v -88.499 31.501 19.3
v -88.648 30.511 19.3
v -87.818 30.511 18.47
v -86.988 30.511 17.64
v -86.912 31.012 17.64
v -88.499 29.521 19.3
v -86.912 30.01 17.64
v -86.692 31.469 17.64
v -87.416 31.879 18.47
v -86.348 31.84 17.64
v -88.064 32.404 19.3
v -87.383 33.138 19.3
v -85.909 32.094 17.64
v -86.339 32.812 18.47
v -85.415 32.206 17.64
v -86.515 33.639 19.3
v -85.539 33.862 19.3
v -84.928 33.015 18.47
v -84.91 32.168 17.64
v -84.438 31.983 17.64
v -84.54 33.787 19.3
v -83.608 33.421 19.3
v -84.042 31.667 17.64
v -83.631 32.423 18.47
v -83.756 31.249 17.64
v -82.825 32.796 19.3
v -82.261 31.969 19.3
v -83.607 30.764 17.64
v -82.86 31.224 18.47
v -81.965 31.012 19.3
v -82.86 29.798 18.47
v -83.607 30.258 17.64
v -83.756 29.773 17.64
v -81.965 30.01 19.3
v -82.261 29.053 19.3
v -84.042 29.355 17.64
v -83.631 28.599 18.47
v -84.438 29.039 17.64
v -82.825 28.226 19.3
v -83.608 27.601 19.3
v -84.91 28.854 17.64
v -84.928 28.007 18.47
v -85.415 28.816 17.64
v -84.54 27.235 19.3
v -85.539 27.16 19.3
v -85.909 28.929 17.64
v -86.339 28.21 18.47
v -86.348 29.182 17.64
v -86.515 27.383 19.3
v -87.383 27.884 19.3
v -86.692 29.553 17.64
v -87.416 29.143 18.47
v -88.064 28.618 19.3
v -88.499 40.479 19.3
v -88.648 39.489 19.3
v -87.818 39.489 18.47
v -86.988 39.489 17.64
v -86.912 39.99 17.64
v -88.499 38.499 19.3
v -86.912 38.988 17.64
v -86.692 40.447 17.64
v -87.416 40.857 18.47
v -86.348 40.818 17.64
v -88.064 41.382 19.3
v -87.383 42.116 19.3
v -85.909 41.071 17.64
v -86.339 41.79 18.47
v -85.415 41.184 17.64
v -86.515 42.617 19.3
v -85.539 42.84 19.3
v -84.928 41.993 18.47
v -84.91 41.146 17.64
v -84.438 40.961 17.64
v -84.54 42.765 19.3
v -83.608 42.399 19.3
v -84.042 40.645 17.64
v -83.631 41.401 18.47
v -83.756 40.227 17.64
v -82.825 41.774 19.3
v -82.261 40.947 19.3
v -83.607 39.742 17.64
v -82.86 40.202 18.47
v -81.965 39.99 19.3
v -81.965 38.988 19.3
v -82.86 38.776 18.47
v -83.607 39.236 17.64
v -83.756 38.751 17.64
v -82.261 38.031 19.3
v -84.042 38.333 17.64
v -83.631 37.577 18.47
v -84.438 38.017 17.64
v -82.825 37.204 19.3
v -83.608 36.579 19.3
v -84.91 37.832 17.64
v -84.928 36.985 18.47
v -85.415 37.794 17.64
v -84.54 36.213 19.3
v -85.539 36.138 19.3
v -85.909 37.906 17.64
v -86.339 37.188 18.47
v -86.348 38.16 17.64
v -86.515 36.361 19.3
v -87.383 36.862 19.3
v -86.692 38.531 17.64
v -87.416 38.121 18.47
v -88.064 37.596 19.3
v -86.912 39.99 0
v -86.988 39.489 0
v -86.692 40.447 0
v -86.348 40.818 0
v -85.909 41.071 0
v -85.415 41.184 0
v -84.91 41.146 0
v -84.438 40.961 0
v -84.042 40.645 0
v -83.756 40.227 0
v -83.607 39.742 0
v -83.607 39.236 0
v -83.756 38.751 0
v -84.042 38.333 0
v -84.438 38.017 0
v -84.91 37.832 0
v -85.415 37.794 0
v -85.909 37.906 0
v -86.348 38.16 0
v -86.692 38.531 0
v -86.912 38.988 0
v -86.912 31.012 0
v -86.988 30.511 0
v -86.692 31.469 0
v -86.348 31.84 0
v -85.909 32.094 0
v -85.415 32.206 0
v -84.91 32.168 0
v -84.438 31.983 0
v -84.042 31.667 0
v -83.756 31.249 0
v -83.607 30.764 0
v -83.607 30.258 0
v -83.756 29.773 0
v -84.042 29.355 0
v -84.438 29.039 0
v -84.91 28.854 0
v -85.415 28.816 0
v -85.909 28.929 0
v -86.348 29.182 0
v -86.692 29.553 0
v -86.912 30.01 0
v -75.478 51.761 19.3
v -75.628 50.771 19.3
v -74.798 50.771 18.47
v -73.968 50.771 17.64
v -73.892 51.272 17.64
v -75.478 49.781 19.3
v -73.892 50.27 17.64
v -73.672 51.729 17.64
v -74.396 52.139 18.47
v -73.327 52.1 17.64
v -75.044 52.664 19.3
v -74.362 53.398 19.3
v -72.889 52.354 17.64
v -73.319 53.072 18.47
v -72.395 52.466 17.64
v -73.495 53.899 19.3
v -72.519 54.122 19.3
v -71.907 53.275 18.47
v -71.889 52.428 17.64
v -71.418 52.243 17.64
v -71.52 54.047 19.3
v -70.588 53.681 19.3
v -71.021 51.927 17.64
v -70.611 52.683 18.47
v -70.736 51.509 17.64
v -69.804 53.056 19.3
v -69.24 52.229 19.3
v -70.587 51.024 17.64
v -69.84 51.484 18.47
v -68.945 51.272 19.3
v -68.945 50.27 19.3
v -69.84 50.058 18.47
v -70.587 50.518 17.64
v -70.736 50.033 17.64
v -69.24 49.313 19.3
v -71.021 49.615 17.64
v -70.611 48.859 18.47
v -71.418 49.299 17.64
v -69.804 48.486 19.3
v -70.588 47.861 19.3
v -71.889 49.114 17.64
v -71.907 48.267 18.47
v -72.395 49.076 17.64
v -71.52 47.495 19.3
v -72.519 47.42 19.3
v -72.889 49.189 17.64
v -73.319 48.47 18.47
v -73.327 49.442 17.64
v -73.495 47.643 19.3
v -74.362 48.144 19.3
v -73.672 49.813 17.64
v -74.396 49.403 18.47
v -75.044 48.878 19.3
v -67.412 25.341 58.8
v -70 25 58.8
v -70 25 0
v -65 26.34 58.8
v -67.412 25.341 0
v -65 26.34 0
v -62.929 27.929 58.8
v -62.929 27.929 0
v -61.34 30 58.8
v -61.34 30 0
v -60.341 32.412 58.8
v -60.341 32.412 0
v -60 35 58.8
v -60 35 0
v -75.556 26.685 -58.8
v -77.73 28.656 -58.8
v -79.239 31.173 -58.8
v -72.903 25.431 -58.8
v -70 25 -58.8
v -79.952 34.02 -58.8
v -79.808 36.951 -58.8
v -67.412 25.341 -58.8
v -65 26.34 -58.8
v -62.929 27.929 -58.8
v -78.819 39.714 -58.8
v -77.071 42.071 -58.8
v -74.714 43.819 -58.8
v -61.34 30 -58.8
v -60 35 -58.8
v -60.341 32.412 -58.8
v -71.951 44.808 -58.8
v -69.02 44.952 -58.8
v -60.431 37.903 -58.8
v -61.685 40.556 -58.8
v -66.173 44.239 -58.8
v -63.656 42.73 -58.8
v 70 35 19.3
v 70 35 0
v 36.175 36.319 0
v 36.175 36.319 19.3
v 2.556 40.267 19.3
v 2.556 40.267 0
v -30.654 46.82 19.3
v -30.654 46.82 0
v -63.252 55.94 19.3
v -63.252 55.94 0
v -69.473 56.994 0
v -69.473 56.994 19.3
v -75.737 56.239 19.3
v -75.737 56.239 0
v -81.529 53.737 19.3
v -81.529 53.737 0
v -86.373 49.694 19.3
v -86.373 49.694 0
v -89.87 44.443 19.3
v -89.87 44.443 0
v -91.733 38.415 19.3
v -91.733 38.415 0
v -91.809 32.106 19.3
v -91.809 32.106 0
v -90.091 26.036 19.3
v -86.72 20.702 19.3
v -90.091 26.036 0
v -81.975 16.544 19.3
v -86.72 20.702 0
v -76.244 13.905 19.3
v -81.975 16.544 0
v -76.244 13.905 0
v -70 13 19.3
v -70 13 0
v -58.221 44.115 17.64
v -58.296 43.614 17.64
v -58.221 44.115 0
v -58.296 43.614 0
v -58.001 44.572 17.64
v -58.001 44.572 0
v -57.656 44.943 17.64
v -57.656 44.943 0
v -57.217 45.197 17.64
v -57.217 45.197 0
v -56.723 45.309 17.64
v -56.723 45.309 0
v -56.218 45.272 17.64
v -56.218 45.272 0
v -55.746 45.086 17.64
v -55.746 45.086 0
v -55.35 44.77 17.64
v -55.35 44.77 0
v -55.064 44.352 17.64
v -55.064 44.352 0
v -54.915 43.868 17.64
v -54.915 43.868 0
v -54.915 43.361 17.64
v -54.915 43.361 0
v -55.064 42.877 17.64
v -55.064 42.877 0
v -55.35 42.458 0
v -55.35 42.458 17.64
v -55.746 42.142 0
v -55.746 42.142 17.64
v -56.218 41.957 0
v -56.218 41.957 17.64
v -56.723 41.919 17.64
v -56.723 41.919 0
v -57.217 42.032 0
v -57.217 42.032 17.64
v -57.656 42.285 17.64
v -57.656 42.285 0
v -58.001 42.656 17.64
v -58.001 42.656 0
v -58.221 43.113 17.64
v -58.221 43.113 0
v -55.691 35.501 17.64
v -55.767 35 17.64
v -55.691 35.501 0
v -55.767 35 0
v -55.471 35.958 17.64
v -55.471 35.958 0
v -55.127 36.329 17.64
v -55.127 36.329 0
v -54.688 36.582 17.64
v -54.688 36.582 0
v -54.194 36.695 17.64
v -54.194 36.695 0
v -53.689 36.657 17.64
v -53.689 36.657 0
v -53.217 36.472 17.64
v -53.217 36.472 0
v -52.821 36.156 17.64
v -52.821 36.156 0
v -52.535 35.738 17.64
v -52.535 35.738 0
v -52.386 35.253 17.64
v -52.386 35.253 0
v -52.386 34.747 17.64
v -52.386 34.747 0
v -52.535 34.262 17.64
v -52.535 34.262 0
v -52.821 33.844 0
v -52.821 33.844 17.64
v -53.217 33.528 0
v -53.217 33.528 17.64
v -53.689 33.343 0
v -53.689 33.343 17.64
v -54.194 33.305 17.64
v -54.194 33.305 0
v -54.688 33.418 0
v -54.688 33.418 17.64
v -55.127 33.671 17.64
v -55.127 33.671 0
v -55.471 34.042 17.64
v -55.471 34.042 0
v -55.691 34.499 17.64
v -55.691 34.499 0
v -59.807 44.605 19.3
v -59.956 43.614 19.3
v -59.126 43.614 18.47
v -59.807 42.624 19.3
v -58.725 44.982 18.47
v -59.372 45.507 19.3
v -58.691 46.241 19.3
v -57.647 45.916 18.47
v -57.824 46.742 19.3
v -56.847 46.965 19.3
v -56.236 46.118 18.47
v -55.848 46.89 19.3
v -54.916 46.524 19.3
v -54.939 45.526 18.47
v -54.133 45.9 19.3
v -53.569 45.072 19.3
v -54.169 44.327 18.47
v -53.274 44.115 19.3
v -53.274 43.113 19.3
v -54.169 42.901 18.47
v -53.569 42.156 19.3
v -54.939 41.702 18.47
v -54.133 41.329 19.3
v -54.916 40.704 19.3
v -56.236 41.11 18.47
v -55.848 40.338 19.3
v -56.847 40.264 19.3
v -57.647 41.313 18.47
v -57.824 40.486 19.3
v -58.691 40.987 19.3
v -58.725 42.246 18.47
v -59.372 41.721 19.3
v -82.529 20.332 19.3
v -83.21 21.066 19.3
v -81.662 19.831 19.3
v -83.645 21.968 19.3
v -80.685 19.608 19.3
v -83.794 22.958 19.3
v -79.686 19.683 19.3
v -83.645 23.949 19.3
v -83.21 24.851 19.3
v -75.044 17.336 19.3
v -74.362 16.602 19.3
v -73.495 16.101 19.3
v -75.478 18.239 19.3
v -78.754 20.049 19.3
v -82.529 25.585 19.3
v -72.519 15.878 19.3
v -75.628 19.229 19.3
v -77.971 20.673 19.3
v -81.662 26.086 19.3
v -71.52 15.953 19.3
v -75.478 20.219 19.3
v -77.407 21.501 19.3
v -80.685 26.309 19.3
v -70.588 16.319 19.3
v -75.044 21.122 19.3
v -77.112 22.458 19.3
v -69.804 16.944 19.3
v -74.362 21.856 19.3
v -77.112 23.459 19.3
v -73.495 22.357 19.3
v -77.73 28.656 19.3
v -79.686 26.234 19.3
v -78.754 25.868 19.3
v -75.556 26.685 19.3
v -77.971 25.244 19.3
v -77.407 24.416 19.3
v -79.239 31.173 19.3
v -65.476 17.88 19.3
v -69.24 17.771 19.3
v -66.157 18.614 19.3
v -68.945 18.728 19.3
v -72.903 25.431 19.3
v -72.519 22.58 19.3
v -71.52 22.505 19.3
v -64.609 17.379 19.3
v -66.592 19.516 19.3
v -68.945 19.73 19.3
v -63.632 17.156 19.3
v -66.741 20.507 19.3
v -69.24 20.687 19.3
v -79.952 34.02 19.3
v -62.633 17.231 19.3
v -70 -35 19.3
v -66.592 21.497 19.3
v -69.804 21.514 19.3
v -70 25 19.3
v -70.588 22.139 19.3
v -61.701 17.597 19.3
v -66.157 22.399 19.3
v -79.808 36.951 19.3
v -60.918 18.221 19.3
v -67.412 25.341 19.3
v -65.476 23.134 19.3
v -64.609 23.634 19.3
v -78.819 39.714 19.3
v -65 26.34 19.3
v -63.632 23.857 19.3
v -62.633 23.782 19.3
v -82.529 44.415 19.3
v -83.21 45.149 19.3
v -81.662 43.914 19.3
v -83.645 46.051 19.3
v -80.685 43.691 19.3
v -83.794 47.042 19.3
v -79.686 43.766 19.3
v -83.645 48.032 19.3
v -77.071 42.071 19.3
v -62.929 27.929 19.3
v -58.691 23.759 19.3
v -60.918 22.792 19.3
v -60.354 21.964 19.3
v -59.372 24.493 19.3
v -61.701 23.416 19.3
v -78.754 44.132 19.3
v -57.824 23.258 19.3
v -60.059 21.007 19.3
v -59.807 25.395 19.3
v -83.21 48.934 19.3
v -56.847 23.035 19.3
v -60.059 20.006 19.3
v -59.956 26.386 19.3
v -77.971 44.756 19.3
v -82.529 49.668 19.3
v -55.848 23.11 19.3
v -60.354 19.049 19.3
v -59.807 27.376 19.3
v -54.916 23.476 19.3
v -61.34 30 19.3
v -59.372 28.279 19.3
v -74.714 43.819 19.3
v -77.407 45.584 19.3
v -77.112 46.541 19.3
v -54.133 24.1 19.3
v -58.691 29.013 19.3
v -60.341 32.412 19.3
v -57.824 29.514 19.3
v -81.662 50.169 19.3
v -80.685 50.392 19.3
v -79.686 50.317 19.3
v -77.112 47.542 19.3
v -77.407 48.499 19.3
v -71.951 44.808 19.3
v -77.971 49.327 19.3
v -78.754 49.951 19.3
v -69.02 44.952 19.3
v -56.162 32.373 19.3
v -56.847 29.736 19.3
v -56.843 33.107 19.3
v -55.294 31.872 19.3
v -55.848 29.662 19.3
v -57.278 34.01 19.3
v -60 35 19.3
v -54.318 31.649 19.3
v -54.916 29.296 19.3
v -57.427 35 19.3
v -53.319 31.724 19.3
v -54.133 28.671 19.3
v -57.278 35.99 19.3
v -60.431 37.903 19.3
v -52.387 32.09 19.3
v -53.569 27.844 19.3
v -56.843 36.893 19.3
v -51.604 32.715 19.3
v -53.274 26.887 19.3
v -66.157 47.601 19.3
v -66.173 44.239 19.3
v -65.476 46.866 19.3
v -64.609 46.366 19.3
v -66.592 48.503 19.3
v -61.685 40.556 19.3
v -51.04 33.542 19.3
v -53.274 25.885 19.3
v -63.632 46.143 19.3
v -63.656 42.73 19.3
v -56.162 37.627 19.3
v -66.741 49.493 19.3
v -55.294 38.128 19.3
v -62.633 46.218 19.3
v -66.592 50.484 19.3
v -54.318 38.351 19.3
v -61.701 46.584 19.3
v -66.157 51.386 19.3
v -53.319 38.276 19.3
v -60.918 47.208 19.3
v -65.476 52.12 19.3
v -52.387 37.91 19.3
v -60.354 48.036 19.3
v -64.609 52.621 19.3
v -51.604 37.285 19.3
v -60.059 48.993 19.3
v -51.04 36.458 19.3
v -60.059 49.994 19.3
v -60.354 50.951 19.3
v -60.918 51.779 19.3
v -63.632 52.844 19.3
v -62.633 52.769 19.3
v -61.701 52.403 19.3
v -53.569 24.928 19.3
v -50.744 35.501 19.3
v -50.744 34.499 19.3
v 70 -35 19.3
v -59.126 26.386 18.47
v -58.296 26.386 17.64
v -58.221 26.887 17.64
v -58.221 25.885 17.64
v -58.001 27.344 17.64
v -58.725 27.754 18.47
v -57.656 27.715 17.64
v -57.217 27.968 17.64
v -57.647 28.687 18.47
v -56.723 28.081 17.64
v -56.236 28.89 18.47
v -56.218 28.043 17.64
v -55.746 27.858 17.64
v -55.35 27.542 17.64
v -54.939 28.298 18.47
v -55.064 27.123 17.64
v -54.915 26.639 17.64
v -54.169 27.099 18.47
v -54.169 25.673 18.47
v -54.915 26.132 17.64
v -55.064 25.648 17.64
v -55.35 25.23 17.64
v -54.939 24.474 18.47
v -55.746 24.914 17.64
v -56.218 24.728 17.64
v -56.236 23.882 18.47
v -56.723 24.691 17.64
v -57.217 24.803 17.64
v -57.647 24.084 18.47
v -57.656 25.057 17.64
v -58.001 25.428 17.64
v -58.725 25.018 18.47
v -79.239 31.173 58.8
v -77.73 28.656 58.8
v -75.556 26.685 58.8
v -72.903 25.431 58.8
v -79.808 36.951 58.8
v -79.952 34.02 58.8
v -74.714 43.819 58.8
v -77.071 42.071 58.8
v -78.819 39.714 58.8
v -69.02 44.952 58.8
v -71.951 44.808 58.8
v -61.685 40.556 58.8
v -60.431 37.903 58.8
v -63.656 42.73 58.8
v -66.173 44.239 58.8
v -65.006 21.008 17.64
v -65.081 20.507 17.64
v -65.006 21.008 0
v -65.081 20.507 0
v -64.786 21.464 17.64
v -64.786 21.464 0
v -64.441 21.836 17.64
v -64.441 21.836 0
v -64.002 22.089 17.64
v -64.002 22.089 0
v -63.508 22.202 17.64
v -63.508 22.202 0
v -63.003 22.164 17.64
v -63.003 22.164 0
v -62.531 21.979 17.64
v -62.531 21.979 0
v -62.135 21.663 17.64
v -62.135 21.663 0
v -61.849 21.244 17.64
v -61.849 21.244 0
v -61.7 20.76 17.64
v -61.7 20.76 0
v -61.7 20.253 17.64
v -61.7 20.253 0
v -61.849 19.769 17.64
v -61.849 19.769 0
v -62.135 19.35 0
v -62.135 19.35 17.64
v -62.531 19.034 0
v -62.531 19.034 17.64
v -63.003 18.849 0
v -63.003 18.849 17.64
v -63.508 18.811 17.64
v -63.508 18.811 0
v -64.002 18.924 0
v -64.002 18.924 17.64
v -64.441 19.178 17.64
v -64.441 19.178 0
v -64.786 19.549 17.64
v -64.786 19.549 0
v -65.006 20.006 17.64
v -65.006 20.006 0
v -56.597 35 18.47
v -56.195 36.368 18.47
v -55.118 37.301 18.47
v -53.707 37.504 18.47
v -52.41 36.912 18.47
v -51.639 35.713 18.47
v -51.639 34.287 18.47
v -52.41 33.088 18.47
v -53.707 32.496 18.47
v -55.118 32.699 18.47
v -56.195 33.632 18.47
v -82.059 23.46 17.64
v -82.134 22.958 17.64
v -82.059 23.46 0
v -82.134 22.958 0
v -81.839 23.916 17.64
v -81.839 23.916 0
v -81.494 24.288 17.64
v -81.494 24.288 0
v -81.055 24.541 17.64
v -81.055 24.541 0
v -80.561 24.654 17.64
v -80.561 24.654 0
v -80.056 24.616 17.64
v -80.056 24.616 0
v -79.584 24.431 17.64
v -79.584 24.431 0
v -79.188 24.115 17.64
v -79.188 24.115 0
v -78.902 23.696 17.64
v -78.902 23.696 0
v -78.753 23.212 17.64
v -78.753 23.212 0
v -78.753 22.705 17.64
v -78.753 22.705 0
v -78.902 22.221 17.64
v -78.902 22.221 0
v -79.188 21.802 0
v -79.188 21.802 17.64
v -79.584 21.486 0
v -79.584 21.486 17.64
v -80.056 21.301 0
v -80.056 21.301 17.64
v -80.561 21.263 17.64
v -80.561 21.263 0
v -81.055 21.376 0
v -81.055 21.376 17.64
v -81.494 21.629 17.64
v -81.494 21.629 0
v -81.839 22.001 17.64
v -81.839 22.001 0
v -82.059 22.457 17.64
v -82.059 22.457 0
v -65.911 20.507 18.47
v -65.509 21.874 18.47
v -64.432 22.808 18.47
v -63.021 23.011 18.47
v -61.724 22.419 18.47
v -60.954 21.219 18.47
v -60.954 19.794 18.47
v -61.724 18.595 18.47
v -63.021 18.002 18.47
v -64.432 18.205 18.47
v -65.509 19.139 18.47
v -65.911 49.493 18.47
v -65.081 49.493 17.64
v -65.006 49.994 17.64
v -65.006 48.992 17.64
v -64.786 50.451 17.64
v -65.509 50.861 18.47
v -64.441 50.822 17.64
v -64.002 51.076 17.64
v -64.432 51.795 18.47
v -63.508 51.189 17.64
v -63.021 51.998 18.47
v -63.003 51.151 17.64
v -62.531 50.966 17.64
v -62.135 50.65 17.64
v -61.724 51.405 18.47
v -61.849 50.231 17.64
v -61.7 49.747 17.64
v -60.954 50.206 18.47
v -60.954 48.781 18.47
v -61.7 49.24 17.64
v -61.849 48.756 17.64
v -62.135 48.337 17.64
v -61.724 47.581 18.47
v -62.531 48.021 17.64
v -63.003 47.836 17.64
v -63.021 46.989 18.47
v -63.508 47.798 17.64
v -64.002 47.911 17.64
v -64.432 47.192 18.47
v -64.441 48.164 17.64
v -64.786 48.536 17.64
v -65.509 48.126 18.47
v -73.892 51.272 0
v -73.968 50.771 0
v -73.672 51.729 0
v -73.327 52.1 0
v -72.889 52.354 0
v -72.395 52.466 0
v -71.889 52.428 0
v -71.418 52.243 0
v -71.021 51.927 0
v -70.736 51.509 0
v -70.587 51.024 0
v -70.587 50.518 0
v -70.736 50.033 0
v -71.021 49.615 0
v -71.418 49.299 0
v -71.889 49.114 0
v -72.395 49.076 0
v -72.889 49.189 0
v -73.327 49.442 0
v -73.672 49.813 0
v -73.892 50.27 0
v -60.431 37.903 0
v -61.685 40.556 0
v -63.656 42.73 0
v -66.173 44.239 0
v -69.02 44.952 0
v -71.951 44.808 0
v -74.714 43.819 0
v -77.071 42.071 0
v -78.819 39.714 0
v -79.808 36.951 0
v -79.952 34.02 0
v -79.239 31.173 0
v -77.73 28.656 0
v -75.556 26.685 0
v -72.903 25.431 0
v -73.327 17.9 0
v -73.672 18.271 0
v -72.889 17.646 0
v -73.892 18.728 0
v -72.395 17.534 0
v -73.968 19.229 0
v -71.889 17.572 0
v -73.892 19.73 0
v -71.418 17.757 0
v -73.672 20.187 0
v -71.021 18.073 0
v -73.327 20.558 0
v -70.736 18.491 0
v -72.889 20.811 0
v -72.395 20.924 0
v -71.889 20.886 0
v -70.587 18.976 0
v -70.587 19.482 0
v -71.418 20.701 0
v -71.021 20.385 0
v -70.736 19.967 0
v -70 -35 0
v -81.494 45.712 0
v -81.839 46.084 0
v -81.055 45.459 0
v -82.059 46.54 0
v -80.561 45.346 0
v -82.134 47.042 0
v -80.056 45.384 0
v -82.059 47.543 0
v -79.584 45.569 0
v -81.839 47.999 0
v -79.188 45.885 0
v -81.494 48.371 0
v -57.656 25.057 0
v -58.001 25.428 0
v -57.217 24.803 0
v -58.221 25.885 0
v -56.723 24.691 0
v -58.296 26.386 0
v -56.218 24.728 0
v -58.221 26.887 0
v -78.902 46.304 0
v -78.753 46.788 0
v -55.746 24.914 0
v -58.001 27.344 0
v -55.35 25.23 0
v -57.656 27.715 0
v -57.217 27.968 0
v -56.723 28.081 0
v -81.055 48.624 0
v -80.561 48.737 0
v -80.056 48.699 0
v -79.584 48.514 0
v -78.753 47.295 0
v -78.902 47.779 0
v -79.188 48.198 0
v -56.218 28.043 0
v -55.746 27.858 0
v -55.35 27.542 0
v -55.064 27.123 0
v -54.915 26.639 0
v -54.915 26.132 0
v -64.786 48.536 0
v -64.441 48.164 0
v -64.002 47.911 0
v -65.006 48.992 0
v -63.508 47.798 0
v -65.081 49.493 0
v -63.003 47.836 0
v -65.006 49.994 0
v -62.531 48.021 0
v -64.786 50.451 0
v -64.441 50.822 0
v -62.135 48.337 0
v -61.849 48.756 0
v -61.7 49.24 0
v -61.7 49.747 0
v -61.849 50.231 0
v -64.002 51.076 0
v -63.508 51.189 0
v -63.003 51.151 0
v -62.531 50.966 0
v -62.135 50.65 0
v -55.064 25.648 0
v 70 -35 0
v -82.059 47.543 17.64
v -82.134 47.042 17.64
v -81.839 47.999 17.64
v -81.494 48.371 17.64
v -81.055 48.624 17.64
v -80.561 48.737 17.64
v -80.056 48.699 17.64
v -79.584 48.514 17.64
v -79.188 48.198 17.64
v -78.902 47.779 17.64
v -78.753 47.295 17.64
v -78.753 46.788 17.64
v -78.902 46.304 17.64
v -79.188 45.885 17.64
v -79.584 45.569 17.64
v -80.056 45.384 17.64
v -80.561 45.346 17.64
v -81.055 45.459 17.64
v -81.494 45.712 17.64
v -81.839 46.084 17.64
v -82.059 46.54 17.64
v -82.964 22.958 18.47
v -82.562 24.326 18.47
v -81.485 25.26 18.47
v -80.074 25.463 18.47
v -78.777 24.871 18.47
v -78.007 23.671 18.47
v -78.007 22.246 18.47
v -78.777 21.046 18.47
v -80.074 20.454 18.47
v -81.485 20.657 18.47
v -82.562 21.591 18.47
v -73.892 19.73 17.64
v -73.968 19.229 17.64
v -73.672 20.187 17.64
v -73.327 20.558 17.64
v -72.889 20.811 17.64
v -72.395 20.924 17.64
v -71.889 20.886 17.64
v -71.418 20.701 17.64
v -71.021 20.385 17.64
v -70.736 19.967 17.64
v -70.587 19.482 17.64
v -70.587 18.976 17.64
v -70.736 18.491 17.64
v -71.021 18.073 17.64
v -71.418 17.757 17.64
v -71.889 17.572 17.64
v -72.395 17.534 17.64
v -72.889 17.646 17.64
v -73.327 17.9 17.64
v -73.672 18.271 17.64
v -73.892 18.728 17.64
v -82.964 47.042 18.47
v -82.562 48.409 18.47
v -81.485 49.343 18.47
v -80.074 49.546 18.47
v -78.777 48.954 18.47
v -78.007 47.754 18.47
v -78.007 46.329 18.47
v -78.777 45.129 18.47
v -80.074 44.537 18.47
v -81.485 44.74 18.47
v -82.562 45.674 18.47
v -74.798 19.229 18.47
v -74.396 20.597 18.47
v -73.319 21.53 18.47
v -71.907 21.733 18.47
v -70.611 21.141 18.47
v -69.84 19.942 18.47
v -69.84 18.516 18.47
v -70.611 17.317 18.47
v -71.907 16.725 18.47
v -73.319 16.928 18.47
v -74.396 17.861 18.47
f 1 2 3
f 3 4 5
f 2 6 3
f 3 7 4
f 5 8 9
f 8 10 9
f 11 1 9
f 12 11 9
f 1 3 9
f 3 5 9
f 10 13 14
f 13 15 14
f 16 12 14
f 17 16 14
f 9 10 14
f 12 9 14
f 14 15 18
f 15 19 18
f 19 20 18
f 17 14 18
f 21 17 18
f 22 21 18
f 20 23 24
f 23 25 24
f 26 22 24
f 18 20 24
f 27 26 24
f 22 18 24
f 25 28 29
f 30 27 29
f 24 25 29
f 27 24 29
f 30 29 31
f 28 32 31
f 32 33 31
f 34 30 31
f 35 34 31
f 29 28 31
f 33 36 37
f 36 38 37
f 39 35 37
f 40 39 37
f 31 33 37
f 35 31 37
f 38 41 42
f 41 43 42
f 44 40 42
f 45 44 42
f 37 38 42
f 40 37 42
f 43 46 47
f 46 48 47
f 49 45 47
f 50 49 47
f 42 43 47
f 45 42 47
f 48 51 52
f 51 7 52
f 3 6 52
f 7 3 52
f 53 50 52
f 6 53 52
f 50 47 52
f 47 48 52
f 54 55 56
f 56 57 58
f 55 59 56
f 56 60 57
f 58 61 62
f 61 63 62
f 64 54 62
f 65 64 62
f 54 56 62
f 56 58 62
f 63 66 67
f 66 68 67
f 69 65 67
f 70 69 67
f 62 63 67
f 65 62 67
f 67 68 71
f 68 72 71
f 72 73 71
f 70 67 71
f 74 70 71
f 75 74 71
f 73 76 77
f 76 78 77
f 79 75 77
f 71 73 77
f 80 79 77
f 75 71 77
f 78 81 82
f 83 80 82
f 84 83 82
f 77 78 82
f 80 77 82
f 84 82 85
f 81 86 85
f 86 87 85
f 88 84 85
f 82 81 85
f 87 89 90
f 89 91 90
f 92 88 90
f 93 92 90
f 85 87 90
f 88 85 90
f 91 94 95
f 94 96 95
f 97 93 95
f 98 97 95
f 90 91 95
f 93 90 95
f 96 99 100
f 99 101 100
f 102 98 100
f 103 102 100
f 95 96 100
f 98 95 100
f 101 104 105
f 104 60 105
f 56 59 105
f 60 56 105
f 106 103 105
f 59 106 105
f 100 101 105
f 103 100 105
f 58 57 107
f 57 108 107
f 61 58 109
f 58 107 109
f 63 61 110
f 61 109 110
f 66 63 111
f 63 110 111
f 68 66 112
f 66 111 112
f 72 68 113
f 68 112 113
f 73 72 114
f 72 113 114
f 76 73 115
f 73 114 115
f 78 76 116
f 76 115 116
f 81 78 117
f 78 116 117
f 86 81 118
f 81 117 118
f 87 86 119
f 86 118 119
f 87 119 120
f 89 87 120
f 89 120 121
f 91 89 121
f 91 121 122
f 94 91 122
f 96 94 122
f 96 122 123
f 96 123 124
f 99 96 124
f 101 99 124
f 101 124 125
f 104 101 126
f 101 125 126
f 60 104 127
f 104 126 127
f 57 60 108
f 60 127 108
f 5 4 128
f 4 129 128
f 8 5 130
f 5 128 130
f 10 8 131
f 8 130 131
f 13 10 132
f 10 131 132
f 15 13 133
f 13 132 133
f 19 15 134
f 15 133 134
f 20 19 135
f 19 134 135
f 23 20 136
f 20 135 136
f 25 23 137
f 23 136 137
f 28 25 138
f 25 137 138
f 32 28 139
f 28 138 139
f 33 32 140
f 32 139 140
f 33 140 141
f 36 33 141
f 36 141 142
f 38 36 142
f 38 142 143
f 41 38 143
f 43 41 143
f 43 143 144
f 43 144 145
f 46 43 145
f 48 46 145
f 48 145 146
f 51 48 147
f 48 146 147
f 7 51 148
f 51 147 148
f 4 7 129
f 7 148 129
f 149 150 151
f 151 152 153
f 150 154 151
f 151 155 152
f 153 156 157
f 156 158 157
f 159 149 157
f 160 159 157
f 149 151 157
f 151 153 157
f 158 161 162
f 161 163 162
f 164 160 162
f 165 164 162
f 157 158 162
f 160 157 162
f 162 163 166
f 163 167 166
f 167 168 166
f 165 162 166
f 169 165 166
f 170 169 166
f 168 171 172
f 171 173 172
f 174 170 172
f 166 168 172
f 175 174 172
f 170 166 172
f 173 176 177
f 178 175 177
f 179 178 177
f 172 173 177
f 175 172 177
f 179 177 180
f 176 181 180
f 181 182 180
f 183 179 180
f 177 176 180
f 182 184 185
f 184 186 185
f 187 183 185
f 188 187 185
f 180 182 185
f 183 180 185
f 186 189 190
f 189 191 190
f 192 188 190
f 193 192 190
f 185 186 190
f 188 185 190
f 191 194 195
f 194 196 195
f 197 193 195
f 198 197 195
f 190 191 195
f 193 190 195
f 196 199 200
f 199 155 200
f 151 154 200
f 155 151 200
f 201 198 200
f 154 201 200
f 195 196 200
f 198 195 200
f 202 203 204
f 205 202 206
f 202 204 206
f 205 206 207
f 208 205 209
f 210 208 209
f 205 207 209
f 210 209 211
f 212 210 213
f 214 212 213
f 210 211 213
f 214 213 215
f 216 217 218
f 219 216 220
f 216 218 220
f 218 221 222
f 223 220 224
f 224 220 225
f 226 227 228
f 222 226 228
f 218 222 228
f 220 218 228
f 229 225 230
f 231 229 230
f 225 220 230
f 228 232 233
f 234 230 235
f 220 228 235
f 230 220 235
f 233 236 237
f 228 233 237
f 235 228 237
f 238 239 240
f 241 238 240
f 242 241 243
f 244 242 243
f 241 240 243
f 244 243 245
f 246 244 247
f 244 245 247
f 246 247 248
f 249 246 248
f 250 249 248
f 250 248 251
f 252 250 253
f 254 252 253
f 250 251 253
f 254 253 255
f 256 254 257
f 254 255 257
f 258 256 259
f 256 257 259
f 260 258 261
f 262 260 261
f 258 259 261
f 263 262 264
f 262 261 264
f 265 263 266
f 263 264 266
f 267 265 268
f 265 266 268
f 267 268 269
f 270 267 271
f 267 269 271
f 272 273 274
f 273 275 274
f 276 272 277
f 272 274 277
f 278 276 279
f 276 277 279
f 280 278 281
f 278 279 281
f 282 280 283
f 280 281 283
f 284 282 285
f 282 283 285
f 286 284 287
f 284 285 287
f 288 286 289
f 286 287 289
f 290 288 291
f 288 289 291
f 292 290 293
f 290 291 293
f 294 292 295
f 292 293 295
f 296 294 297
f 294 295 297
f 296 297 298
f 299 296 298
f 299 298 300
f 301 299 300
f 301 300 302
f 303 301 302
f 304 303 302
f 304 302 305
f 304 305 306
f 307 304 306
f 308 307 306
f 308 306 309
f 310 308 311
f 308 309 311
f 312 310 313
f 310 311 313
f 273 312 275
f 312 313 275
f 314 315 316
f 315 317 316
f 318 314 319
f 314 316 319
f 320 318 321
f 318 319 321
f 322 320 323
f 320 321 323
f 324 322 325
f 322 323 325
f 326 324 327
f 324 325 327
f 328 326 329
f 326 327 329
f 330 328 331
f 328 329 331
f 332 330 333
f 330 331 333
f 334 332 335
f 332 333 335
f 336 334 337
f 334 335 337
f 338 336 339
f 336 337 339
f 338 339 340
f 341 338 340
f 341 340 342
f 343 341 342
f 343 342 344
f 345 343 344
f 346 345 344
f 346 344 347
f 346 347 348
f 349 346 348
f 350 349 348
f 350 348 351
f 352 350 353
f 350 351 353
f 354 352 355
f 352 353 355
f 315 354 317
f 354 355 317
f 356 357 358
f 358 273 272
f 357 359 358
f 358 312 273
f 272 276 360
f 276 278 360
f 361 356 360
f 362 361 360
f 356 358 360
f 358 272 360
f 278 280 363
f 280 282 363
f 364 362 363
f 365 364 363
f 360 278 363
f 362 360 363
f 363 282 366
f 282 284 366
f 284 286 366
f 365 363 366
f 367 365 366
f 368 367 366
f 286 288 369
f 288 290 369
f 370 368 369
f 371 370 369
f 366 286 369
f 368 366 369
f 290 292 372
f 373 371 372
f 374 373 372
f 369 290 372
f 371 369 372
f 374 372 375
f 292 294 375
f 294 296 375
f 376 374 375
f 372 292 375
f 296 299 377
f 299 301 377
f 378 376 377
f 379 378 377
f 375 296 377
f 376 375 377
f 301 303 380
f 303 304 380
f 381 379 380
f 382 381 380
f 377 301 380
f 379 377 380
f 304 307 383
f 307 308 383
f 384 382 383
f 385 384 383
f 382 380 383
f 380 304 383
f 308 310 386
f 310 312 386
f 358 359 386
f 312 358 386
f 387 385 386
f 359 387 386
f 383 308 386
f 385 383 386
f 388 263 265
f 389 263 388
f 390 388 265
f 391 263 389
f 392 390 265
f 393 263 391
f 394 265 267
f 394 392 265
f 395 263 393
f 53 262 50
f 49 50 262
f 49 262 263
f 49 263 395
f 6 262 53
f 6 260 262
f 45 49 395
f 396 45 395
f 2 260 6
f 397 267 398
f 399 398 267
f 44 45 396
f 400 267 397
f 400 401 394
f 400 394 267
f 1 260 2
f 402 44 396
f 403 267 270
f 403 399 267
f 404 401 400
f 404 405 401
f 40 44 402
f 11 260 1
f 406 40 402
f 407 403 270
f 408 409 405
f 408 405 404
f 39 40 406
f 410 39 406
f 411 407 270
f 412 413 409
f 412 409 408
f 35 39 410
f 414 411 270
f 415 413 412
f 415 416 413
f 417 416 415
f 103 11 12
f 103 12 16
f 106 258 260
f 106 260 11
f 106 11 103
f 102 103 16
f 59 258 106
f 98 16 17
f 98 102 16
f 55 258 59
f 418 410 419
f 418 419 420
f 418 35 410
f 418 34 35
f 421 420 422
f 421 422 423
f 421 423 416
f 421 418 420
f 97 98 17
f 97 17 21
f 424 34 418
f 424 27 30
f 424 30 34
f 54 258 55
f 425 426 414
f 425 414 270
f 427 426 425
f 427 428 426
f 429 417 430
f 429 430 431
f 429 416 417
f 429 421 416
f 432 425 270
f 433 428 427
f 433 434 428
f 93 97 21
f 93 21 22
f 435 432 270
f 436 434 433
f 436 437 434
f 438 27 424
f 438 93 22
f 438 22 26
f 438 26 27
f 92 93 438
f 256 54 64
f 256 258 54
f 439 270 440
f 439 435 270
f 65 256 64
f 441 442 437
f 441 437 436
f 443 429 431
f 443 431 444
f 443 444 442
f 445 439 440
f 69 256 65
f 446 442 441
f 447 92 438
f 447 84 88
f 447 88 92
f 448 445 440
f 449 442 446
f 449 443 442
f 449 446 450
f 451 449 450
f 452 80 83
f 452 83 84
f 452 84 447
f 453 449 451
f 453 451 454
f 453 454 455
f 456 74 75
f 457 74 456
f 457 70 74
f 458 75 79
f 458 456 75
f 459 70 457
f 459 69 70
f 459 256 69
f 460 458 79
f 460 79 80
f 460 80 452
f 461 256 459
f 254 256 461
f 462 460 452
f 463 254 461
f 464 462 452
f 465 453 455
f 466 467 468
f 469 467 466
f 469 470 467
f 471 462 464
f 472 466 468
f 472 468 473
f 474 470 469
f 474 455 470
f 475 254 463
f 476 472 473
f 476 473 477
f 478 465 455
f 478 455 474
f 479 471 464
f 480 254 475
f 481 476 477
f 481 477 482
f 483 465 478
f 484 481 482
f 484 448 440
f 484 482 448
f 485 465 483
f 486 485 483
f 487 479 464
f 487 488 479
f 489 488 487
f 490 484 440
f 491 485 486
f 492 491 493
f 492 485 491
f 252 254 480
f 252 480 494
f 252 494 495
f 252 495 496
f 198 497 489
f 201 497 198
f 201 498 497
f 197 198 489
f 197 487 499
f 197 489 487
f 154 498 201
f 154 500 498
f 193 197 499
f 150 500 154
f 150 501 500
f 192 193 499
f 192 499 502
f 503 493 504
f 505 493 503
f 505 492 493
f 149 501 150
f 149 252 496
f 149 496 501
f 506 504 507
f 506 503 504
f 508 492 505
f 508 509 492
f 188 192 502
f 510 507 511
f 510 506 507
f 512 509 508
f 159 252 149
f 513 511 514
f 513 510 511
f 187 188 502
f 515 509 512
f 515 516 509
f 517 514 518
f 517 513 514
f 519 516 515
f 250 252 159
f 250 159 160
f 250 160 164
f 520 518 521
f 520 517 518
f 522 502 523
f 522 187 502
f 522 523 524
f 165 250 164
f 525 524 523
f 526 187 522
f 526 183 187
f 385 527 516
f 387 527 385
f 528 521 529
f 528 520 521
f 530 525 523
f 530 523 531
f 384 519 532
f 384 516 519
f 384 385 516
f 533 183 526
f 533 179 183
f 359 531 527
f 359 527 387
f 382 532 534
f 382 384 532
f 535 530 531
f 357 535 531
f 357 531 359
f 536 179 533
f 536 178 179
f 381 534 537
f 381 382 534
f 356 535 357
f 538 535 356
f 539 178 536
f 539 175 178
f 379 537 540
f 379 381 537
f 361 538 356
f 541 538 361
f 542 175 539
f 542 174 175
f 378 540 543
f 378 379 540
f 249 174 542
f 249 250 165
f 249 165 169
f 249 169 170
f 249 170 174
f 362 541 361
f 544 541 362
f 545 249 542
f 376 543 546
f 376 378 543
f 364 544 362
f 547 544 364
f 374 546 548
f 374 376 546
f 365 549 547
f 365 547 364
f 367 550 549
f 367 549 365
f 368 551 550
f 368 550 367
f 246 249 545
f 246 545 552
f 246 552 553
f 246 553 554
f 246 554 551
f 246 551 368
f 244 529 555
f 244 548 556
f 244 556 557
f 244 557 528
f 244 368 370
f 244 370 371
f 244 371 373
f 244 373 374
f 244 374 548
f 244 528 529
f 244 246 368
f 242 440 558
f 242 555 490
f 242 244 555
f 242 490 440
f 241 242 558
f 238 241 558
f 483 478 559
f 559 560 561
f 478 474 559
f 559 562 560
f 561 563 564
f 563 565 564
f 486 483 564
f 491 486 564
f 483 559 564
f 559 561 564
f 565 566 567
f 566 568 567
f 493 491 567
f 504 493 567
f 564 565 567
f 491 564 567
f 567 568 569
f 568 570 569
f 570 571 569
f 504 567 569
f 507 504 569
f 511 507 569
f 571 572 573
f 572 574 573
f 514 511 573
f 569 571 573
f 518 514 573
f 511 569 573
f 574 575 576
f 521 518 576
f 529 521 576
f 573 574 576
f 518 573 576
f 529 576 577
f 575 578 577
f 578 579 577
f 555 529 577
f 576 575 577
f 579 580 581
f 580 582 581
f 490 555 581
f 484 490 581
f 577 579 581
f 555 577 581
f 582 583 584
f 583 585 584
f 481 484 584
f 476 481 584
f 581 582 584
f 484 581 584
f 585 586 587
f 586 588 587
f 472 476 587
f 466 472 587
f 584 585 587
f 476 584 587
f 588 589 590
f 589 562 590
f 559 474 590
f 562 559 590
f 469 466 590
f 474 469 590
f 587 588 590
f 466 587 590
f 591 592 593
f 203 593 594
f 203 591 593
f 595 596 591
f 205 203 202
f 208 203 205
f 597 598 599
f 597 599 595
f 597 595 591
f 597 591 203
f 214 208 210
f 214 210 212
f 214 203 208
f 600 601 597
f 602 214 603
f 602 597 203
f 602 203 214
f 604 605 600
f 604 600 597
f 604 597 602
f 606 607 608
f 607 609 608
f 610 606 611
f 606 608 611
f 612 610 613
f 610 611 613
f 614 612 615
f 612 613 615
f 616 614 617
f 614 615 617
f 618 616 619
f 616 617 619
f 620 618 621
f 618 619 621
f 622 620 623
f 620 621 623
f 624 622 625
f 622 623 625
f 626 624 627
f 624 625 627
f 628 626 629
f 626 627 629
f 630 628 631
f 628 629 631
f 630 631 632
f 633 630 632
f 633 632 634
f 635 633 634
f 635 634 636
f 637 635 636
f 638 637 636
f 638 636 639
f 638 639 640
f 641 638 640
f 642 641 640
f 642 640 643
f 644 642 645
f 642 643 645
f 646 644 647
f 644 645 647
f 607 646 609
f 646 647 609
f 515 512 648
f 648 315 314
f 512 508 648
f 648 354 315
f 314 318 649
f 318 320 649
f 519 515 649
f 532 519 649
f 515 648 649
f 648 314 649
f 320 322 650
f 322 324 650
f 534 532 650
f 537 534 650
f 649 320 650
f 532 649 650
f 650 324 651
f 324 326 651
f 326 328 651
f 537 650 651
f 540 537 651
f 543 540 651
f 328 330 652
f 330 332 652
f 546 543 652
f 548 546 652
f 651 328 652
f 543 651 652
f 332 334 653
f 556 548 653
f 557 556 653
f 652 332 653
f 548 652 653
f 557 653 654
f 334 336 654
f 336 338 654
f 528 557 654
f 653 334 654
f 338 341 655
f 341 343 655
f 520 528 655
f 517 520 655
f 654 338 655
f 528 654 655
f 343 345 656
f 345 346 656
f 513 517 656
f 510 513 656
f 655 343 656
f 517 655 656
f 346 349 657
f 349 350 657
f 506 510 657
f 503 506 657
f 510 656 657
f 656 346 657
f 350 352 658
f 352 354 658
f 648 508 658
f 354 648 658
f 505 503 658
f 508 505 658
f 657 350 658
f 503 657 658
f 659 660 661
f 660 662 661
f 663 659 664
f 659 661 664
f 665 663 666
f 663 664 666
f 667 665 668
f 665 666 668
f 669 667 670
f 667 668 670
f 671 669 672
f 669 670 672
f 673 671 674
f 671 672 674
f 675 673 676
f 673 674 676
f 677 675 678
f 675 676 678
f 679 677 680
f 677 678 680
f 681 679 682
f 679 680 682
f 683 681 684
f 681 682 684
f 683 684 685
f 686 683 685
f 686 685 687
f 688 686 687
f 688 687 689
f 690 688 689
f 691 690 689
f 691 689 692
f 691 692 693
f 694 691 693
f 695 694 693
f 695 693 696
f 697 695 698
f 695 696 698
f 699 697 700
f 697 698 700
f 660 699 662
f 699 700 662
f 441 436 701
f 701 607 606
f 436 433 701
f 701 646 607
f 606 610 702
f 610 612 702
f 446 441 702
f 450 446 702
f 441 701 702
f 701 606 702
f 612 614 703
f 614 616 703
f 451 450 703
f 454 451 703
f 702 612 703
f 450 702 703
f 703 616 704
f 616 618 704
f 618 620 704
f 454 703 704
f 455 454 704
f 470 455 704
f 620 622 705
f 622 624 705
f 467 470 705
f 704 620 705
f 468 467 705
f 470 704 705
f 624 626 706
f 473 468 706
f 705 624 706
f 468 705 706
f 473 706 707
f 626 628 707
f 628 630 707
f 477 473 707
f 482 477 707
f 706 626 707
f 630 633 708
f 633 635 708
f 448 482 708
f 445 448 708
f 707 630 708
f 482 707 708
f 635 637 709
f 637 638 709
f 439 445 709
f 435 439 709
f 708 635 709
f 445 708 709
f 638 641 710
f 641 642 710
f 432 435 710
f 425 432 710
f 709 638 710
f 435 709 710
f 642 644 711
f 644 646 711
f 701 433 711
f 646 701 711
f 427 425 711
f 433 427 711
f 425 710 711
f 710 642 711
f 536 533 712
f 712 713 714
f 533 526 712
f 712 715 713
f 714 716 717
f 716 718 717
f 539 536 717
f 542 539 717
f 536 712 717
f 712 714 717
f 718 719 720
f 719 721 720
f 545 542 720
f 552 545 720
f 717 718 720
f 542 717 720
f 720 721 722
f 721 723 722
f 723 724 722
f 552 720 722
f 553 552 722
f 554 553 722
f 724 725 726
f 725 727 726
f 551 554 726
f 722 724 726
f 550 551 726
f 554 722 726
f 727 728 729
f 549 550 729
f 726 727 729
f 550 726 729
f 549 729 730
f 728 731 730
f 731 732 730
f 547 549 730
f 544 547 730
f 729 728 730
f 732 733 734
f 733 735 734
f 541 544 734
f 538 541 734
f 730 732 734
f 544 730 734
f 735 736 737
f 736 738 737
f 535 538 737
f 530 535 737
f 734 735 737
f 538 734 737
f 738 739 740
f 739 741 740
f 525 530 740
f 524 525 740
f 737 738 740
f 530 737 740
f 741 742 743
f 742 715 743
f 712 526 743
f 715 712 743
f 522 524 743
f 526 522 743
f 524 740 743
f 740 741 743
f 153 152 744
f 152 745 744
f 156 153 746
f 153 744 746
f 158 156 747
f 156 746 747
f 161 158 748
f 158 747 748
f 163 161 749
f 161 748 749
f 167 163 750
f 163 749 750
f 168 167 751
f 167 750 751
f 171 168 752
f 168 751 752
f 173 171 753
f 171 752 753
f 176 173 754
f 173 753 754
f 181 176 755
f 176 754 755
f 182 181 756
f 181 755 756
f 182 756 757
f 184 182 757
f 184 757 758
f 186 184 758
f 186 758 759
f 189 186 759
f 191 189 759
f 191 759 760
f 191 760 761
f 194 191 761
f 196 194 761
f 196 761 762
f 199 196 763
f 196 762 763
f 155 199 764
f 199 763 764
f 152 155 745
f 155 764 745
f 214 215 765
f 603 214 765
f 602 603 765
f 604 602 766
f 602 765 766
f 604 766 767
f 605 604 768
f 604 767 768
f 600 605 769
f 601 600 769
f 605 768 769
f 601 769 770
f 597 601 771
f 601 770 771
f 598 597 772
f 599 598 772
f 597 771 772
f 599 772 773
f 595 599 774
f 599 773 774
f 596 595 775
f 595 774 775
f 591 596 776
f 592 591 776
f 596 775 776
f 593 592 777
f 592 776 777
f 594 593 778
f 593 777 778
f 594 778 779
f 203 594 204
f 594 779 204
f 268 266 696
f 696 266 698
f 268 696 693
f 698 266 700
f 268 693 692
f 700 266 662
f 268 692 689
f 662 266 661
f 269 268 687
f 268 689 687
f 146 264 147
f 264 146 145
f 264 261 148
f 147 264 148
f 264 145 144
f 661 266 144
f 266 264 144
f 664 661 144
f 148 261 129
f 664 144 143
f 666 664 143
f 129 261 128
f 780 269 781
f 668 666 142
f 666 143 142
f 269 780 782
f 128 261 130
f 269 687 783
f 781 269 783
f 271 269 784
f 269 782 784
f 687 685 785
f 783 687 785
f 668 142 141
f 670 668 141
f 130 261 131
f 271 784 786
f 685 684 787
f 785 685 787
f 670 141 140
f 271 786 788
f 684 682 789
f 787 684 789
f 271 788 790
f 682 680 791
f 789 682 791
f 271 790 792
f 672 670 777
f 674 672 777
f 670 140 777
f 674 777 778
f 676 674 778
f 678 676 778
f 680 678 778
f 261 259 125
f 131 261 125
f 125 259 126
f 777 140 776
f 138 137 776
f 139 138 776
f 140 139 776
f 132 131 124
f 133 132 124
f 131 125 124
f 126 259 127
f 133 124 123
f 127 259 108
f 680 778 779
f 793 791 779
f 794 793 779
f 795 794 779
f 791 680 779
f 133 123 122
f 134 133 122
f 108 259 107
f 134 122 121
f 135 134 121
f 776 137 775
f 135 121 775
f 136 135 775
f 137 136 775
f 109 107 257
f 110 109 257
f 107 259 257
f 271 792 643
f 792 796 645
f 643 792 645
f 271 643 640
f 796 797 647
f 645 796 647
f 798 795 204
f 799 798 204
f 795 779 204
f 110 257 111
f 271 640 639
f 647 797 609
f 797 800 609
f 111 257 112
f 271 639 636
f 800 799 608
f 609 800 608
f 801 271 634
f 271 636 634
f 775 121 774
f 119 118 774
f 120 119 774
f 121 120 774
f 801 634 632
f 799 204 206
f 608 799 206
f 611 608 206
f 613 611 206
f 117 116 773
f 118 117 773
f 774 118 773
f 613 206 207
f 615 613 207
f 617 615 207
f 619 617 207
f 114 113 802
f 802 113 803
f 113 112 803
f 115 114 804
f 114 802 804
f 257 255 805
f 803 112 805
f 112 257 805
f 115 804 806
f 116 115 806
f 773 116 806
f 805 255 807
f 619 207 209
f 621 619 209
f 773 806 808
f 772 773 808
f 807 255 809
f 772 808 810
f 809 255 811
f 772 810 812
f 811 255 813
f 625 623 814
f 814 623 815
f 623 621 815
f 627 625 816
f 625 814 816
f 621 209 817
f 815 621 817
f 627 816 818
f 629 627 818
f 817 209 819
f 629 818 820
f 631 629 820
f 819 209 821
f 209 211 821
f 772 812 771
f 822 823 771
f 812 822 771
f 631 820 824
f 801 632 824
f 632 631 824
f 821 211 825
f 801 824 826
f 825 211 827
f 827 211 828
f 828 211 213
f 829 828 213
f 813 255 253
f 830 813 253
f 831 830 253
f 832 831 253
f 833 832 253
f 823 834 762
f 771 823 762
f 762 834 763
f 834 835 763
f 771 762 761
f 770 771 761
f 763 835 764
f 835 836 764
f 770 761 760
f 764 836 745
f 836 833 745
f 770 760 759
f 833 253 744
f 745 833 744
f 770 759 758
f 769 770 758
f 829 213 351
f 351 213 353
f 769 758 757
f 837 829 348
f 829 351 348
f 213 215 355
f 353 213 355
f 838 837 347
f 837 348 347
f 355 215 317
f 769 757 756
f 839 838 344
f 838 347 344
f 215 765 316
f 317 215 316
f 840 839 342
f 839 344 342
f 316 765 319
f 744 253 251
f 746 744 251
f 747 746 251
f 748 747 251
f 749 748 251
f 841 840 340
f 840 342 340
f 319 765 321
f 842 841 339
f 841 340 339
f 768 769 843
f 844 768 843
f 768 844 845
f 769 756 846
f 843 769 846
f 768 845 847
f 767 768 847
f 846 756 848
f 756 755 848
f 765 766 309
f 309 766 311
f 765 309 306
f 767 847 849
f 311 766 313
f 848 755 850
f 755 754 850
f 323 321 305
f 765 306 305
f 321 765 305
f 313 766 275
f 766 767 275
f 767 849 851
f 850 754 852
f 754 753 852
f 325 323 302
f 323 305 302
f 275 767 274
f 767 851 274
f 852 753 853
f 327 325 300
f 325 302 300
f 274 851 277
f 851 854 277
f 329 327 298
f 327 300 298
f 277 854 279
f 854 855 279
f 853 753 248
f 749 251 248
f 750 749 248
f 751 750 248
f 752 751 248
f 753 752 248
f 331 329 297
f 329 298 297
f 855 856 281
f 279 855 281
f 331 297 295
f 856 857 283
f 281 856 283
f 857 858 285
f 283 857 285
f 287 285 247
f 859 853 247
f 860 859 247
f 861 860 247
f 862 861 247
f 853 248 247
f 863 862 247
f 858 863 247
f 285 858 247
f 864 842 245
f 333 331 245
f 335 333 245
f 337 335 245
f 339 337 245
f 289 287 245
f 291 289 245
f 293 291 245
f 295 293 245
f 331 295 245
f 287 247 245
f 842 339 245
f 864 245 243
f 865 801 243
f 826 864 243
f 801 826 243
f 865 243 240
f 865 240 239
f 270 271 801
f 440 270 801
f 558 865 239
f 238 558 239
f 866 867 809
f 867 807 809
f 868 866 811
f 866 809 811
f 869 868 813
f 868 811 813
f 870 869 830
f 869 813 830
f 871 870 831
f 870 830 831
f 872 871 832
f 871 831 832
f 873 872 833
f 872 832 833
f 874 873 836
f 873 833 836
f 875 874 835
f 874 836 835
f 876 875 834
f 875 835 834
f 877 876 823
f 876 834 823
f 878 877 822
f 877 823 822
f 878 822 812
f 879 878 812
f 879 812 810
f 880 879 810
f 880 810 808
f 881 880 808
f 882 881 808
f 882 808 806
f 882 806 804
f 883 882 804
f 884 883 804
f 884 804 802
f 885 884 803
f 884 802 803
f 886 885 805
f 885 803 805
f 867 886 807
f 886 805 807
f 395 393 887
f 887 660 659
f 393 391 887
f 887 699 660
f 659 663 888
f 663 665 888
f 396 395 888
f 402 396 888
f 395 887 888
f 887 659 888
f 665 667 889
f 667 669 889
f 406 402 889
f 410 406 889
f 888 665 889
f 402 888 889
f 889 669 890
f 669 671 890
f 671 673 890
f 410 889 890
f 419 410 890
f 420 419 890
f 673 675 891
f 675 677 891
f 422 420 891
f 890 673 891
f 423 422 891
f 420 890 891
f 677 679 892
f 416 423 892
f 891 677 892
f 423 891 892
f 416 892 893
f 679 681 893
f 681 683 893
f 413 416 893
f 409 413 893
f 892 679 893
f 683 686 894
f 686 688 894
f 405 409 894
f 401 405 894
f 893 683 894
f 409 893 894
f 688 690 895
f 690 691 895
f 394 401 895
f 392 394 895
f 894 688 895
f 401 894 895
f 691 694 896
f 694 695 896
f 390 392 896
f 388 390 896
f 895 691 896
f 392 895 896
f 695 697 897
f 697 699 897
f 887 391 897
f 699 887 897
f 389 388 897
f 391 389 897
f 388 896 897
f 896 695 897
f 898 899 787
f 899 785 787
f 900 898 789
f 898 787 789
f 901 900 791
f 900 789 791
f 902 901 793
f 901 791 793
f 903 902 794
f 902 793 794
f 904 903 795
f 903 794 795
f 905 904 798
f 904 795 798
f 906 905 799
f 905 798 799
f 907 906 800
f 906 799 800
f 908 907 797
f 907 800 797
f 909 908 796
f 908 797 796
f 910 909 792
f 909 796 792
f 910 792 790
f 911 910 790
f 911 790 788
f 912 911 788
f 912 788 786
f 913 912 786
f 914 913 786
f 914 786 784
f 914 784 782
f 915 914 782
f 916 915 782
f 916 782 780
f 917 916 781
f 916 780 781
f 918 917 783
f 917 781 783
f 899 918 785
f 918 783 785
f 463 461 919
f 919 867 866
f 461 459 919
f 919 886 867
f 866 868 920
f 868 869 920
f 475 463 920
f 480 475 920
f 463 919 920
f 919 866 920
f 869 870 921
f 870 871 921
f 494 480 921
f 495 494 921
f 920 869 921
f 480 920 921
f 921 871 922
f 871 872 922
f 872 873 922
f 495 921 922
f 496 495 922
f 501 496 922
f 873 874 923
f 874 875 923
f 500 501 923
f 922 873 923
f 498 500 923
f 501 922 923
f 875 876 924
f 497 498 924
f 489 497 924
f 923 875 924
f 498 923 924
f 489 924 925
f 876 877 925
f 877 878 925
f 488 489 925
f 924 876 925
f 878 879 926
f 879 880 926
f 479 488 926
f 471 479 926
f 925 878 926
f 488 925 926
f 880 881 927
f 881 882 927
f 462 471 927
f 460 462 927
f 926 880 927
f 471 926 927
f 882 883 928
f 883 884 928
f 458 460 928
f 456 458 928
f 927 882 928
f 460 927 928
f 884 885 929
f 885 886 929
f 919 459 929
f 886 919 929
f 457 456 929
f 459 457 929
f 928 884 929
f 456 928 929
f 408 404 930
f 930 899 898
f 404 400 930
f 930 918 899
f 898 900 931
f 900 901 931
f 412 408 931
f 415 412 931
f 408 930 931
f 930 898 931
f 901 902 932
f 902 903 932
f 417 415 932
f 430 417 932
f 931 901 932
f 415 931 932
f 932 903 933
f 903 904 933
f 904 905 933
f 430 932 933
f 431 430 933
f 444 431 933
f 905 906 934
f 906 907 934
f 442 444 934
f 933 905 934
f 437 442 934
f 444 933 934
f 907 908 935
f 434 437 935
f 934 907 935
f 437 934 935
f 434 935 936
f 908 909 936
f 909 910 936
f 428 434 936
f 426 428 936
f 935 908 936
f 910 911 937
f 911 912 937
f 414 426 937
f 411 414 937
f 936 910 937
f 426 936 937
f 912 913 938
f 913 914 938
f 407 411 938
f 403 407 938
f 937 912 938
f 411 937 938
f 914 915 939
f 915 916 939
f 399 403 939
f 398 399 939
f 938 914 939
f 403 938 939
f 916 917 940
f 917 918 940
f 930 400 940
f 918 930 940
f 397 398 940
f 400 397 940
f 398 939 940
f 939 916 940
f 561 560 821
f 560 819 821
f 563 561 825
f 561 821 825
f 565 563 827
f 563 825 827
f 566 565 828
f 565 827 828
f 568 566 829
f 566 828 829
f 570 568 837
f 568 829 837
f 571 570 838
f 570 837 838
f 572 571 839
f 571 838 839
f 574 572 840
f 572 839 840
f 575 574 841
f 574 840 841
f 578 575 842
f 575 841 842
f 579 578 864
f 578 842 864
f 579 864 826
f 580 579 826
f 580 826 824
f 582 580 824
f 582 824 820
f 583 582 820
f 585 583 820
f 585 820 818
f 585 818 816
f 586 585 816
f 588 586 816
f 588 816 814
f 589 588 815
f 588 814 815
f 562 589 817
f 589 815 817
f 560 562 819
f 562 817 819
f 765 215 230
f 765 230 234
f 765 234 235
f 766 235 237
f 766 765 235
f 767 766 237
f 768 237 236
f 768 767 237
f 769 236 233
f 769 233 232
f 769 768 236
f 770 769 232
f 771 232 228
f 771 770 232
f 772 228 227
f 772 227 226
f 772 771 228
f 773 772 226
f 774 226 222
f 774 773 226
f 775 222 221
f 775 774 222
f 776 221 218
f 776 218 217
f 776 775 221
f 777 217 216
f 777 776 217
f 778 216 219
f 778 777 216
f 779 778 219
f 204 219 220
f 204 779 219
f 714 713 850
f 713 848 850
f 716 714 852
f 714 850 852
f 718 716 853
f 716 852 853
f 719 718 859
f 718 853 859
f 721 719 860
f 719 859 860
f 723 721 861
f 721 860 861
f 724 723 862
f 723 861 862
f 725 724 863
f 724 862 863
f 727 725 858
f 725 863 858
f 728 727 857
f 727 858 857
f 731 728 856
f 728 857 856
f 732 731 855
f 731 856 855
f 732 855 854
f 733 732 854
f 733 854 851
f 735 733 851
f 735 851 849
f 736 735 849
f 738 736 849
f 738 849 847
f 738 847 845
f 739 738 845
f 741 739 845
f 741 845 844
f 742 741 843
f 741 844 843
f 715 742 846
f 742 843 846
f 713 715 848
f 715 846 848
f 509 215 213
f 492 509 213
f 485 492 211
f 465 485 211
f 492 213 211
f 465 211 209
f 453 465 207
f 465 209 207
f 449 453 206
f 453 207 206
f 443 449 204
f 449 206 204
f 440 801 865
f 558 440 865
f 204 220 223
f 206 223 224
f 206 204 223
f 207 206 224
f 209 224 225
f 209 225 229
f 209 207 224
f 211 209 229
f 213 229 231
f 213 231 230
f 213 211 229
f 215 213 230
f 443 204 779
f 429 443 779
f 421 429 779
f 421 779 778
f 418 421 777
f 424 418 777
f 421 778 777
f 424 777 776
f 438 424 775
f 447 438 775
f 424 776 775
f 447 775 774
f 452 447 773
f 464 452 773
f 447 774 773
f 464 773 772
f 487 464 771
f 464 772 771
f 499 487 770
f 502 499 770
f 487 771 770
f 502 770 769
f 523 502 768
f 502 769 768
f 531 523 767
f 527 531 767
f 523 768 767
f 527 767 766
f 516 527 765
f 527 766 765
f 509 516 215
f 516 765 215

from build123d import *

# Parameters (mm, degrees)
F1_DEPTH       = 19.3
F2_DEPTH       = 58.8
F4_D           = 3.4
F4_CSINK_D     = 6.72
F4_CSINK_ANGLE = 90


with BuildPart() as f1:
    # F0 (on Top) → F1 (new body)
    with BuildSketch(Plane.XY):
        with BuildLine():
            ThreePointArc((-63.2523401713, 55.9396534555), (-91.7332967589, 38.4152323478), (-70, 13))
            Line((-70, 13), (-70, 25))
            ThreePointArc((-70, 25), (-77.0710678119, 42.0710678119), (-60, 35))
            Line((-60, 35), (-48, 35))
            ThreePointArc((-48, 35), (-52.2173045318, 47.9528275633), (-63.2523401713, 55.9396534555))
        make_face()
        with BuildLine():
            Line((-48, 35), (70, 35))
            ThreePointArc((70, 35), (2.5562173956, 40.266837972), (-63.2523401713, 55.9396534555))
            ThreePointArc((-63.2523401713, 55.9396534555), (-52.2173045318, 47.9528275633), (-48, 35))
        make_face()
        with BuildLine():
            Line((-70, 25), (-70, 13))
            ThreePointArc((-70, 13), (-54.4436508139, 19.4436508139), (-48, 35))
            Line((-48, 35), (-60, 35))
            ThreePointArc((-60, 35), (-62.9289321881, 27.9289321881), (-70, 25))
        make_face()
        with BuildLine():
            Line((-70, -35), (70, -35))
            Line((70, -35), (70, 35))
            Line((70, 35), (-48, 35))
            ThreePointArc((-48, 35), (-54.4436508139, 19.4436508139), (-70, 13))
            Line((-70, 13), (-70, -35))
        make_face()
    extrude(amount=F1_DEPTH)

    # F4 (through all)
    with Locations(Plane.XY.offset(19.3)):
        with Locations((-72.267531371, 50.7710270998), (-63.3811077933, 49.4933522781), (-56.5961357243, 43.6141405132), (-54.0667958558, 35), (-56.5961357243, 26.3858594868), (-63.3811077933, 20.5066477219), (-72.267531371, 19.2289729002), (-80.43402976, 22.9584877499), (-85.2877974236, 30.5110976578), (-85.2877974236, 39.4889023422), (-80.43402976, 47.0415122501)):
            CounterSinkHole(F4_D / 2, F4_CSINK_D / 2, counter_sink_angle=F4_CSINK_ANGLE)


with BuildPart() as f2:
    # F0 (on Top) → F2 (new body, symmetric)
    with BuildSketch(Plane.XY):
        with BuildLine():
            ThreePointArc((-60, 35), (-77.0710678119, 42.0710678119), (-70, 25))
            Line((-70, 25), (-70, 35))
            Line((-70, 35), (-60, 35))
        make_face()
        with BuildLine():
            Line((-70, 35), (-70, 25))
            ThreePointArc((-70, 25), (-62.9289321881, 27.9289321881), (-60, 35))
            Line((-60, 35), (-70, 35))
        make_face()
    extrude(amount=F2_DEPTH, both=True)


solid = Compound([f1.part, f2.part])
